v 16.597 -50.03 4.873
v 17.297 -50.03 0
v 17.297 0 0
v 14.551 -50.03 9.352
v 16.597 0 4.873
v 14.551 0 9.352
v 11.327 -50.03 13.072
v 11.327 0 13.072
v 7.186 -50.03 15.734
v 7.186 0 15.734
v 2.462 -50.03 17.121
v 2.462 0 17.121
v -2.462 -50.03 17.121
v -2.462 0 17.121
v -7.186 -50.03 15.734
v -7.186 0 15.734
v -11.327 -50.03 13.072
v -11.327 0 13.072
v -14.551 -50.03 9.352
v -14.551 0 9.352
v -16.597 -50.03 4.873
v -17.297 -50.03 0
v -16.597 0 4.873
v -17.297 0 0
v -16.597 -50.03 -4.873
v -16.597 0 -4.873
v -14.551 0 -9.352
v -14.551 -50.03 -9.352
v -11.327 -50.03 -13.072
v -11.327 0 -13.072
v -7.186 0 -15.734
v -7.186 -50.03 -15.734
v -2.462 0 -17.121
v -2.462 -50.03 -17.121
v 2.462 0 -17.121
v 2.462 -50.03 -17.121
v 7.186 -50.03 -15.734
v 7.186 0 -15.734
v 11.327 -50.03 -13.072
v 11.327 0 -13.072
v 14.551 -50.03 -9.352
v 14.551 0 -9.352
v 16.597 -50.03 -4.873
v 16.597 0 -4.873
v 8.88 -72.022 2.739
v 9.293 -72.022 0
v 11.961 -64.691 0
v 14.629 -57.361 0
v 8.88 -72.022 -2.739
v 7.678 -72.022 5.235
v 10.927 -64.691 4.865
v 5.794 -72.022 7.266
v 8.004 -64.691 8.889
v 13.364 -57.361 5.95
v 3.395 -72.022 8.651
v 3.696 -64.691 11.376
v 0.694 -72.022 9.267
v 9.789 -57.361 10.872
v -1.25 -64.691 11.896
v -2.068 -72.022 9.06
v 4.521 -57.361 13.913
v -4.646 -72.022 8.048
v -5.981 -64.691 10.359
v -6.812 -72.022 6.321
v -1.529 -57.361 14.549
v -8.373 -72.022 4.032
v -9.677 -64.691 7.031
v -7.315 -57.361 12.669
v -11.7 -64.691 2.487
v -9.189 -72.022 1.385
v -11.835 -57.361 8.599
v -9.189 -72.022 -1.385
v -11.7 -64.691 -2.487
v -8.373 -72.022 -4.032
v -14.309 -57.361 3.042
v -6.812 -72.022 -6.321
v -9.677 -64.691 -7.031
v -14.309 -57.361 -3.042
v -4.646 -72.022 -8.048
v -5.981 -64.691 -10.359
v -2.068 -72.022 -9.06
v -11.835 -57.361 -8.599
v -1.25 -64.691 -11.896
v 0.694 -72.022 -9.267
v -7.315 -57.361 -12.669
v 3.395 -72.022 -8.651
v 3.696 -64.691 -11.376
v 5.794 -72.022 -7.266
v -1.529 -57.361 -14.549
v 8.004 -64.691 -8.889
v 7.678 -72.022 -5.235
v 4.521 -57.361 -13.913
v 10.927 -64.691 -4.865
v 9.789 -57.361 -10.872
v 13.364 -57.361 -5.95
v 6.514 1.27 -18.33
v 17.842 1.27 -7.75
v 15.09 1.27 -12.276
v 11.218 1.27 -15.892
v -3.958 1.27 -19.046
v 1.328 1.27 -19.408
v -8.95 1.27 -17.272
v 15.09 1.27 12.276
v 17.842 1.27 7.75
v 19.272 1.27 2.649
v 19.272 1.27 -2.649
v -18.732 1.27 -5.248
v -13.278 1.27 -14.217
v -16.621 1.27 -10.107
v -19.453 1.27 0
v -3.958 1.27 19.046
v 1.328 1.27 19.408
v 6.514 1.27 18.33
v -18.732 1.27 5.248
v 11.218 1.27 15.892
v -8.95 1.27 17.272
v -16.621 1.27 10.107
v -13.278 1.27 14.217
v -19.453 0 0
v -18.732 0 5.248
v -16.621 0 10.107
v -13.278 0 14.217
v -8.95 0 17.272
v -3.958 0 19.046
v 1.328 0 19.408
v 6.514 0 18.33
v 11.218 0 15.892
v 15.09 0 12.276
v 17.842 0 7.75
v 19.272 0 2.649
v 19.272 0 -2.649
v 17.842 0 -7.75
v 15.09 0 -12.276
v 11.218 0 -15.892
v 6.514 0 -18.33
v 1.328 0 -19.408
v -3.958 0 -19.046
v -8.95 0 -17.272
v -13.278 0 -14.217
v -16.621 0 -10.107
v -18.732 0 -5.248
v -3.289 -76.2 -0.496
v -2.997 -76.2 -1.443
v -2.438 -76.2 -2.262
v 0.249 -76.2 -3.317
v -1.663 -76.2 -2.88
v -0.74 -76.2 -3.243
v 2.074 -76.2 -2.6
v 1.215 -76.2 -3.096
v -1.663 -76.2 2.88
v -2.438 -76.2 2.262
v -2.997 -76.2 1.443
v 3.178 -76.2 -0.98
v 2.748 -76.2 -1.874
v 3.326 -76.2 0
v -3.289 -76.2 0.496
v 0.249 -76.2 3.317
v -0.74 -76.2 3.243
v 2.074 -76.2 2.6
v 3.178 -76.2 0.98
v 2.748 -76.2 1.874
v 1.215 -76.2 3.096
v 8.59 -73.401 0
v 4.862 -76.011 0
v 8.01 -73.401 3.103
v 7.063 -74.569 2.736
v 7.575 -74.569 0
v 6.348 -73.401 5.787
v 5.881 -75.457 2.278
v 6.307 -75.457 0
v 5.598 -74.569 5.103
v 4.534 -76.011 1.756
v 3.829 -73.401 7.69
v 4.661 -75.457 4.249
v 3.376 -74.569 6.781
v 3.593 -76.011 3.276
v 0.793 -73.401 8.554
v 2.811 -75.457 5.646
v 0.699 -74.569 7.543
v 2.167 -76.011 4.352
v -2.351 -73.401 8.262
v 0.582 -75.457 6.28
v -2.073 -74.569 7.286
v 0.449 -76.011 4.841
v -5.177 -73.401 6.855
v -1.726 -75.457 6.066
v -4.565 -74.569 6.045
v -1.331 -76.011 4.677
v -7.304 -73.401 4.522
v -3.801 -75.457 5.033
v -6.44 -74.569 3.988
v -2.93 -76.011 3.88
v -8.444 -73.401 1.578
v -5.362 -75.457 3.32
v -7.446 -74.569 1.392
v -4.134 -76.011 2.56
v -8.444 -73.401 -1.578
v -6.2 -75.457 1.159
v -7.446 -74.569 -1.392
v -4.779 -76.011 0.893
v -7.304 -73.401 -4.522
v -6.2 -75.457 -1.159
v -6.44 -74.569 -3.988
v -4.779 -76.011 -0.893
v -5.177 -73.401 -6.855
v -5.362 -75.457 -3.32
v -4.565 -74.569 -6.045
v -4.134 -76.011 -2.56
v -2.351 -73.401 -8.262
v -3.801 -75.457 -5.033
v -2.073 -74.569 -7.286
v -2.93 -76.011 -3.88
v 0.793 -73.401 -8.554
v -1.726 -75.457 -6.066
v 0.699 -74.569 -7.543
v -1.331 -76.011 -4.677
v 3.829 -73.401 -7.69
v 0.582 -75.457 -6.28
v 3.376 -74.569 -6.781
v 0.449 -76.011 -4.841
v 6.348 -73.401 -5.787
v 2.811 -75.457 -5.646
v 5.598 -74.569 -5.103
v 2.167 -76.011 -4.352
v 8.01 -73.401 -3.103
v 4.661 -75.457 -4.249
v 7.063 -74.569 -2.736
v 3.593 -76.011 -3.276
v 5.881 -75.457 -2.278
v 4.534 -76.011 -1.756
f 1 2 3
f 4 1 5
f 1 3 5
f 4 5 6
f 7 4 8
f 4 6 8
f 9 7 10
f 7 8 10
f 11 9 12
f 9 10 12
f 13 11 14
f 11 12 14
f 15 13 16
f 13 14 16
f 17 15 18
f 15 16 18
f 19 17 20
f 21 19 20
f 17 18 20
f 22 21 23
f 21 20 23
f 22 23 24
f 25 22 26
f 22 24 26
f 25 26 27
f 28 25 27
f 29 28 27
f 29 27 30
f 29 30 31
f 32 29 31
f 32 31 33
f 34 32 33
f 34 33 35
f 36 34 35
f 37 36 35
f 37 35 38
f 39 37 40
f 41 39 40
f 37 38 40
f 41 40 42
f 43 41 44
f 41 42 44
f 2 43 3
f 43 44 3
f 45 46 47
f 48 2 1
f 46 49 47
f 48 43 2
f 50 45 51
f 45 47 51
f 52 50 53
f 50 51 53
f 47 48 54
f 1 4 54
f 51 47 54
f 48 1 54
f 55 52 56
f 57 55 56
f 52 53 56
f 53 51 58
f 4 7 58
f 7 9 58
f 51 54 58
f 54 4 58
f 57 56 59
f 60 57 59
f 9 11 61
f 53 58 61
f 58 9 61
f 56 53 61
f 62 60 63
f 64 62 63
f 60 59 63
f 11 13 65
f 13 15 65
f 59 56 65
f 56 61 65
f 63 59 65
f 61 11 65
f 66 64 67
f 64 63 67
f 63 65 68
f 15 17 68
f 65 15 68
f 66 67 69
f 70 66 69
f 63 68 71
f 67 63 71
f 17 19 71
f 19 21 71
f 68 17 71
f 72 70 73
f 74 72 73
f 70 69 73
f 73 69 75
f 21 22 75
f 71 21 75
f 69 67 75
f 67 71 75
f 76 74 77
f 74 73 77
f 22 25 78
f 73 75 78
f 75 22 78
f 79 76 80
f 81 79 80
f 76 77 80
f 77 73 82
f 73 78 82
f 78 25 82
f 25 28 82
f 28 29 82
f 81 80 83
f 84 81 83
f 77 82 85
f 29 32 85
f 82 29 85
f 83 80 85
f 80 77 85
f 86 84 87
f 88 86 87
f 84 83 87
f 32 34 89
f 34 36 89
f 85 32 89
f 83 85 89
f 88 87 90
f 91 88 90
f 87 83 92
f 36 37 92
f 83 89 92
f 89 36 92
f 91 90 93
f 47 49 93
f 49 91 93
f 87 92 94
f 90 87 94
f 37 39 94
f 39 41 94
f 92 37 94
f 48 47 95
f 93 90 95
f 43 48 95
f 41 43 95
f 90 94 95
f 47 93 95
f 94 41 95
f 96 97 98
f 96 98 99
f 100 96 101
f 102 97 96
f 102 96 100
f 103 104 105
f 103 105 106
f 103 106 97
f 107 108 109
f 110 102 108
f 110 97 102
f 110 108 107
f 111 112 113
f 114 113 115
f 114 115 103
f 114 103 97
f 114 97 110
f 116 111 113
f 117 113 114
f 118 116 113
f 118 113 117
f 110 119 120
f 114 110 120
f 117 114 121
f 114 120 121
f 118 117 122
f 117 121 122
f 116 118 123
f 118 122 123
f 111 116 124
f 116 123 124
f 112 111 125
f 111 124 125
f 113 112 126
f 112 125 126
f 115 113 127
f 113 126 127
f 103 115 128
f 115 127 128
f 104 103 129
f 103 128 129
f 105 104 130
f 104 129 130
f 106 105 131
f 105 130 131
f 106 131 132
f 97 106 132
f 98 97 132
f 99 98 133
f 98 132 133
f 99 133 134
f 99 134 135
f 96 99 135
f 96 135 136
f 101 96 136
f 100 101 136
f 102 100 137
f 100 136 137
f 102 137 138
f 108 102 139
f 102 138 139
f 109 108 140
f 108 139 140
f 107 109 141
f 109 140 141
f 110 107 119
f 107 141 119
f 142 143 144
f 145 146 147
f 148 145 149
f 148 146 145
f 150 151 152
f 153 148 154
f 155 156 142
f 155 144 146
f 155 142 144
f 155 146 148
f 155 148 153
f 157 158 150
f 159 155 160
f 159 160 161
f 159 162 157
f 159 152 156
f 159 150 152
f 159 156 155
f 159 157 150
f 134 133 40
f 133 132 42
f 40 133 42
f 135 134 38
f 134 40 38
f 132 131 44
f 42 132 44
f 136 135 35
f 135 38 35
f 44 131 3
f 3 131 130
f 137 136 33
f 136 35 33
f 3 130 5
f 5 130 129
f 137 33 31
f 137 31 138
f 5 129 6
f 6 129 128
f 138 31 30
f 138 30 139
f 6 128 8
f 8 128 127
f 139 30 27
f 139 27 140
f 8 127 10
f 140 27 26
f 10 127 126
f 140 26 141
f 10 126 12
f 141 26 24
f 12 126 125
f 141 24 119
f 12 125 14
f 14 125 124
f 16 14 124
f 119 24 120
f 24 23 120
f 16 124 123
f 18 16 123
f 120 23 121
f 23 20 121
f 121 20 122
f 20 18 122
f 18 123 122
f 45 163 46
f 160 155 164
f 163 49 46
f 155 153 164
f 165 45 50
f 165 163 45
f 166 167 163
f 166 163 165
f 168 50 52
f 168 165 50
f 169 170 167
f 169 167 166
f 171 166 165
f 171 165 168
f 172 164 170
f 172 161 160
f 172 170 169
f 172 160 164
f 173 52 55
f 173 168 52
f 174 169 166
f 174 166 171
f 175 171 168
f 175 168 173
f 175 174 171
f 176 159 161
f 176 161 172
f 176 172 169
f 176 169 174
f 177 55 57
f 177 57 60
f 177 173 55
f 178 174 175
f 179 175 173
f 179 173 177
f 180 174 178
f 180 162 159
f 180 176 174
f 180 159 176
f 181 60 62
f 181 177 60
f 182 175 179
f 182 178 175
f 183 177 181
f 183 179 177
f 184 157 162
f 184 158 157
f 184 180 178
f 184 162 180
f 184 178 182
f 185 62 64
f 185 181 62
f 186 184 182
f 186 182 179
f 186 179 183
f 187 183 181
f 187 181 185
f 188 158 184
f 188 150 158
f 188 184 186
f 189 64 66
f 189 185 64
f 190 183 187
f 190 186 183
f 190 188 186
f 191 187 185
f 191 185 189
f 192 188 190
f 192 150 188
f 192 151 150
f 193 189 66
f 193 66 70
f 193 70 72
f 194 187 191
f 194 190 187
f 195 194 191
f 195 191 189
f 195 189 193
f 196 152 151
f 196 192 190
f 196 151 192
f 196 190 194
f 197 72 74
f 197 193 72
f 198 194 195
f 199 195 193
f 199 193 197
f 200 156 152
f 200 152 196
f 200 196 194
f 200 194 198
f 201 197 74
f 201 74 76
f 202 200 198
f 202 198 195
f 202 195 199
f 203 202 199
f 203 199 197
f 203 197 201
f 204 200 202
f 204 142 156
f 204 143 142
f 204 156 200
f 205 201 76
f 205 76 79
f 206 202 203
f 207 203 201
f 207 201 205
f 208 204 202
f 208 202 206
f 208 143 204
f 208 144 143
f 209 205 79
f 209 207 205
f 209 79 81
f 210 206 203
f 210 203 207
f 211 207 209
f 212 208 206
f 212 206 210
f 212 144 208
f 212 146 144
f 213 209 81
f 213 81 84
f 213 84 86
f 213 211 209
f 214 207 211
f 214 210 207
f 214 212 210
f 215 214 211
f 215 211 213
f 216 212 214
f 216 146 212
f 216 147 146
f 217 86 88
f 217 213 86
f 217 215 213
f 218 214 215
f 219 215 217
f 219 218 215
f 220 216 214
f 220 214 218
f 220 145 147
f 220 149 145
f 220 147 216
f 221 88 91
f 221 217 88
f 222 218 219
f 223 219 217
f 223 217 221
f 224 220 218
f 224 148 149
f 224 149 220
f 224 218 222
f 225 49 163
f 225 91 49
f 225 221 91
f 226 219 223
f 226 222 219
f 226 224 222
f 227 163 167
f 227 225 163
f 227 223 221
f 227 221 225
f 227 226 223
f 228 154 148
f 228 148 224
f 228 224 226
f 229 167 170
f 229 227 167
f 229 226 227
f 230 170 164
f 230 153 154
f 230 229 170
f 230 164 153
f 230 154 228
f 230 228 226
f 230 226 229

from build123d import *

# Parameters (mm, degrees)
F0_R     = 17.2972377105
F1_DEPTH = 76.2
F2_SIZE2 = 26.1697224203
F2_SIZE  = 9.525
F3_R     = 6.35
F4_R     = 19.4529047129
F5_DEPTH = 1.27


with BuildPart() as f1:
    # F0 (on Front) → F1 (new body)
    with BuildSketch(Plane.XZ):
        Circle(F0_R)
    extrude(amount=F1_DEPTH)

    # F2
    f2_edges = [f1.edges().sort_by_distance(p)[0] for p in [
        (-17.297238, -76.2, 0),
    ]]
    f2_side = f1.faces().sort_by_distance((0, -76.2, 0))[0]
    chamfer(f2_edges, length=F2_SIZE, length2=F2_SIZE2, reference=f2_side)

    # F3
    f3_edges = [f1.edges().sort_by_distance(p)[0] for p in [
        (-7.772238, -76.2, 0),
    ]]
    fillet(f3_edges, radius=F3_R)

    # F4 (on face) → F5 (join)
    with BuildSketch(Plane(origin=(0, 0, 0), x_dir=(-1, 0, 0), z_dir=(0, 1, 0))):
        Circle(F4_R)
    extrude(amount=F5_DEPTH)


solid = f1.part
